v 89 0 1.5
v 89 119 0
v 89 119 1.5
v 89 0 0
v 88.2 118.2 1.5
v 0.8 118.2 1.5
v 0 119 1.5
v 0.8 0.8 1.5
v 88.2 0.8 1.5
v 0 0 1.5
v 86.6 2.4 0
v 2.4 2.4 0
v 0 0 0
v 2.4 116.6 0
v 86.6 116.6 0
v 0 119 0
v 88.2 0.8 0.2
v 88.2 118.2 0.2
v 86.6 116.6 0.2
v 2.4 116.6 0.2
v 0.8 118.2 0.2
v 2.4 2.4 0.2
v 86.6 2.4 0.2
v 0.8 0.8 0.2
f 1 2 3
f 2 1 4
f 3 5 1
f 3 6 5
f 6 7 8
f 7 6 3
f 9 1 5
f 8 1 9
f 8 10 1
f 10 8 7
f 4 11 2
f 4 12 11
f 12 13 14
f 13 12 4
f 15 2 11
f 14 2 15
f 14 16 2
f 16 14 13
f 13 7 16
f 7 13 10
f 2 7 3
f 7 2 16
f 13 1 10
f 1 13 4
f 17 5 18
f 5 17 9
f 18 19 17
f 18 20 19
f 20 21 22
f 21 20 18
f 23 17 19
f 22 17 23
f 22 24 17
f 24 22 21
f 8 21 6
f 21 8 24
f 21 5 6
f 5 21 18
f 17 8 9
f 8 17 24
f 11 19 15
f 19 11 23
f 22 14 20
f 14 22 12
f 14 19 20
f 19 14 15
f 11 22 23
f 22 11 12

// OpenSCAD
//Frame for using plain film or photopaper in glass plate camera
//Supposed to be supported from the other side with some smaller sized plate
//Too bendy, I ended up using part made of harder materials
width=89;
height=119;
depth=1.5;
thickness=0.2;
wall=0.8;
border=1.6;
air=0.5;
difference() {
  cube([width,height,depth]);
  translate([wall,wall,thickness]) cube([width-2*wall,height-2*wall,depth]);
  translate([wall+border,wall+border,-0.01]) cube([width-2*wall-2*border,height-2*wall-2*border,depth]);
}
*cube([width-2*wall-2*air,height-2*wall-air*2,depth]); //this can be the plate
